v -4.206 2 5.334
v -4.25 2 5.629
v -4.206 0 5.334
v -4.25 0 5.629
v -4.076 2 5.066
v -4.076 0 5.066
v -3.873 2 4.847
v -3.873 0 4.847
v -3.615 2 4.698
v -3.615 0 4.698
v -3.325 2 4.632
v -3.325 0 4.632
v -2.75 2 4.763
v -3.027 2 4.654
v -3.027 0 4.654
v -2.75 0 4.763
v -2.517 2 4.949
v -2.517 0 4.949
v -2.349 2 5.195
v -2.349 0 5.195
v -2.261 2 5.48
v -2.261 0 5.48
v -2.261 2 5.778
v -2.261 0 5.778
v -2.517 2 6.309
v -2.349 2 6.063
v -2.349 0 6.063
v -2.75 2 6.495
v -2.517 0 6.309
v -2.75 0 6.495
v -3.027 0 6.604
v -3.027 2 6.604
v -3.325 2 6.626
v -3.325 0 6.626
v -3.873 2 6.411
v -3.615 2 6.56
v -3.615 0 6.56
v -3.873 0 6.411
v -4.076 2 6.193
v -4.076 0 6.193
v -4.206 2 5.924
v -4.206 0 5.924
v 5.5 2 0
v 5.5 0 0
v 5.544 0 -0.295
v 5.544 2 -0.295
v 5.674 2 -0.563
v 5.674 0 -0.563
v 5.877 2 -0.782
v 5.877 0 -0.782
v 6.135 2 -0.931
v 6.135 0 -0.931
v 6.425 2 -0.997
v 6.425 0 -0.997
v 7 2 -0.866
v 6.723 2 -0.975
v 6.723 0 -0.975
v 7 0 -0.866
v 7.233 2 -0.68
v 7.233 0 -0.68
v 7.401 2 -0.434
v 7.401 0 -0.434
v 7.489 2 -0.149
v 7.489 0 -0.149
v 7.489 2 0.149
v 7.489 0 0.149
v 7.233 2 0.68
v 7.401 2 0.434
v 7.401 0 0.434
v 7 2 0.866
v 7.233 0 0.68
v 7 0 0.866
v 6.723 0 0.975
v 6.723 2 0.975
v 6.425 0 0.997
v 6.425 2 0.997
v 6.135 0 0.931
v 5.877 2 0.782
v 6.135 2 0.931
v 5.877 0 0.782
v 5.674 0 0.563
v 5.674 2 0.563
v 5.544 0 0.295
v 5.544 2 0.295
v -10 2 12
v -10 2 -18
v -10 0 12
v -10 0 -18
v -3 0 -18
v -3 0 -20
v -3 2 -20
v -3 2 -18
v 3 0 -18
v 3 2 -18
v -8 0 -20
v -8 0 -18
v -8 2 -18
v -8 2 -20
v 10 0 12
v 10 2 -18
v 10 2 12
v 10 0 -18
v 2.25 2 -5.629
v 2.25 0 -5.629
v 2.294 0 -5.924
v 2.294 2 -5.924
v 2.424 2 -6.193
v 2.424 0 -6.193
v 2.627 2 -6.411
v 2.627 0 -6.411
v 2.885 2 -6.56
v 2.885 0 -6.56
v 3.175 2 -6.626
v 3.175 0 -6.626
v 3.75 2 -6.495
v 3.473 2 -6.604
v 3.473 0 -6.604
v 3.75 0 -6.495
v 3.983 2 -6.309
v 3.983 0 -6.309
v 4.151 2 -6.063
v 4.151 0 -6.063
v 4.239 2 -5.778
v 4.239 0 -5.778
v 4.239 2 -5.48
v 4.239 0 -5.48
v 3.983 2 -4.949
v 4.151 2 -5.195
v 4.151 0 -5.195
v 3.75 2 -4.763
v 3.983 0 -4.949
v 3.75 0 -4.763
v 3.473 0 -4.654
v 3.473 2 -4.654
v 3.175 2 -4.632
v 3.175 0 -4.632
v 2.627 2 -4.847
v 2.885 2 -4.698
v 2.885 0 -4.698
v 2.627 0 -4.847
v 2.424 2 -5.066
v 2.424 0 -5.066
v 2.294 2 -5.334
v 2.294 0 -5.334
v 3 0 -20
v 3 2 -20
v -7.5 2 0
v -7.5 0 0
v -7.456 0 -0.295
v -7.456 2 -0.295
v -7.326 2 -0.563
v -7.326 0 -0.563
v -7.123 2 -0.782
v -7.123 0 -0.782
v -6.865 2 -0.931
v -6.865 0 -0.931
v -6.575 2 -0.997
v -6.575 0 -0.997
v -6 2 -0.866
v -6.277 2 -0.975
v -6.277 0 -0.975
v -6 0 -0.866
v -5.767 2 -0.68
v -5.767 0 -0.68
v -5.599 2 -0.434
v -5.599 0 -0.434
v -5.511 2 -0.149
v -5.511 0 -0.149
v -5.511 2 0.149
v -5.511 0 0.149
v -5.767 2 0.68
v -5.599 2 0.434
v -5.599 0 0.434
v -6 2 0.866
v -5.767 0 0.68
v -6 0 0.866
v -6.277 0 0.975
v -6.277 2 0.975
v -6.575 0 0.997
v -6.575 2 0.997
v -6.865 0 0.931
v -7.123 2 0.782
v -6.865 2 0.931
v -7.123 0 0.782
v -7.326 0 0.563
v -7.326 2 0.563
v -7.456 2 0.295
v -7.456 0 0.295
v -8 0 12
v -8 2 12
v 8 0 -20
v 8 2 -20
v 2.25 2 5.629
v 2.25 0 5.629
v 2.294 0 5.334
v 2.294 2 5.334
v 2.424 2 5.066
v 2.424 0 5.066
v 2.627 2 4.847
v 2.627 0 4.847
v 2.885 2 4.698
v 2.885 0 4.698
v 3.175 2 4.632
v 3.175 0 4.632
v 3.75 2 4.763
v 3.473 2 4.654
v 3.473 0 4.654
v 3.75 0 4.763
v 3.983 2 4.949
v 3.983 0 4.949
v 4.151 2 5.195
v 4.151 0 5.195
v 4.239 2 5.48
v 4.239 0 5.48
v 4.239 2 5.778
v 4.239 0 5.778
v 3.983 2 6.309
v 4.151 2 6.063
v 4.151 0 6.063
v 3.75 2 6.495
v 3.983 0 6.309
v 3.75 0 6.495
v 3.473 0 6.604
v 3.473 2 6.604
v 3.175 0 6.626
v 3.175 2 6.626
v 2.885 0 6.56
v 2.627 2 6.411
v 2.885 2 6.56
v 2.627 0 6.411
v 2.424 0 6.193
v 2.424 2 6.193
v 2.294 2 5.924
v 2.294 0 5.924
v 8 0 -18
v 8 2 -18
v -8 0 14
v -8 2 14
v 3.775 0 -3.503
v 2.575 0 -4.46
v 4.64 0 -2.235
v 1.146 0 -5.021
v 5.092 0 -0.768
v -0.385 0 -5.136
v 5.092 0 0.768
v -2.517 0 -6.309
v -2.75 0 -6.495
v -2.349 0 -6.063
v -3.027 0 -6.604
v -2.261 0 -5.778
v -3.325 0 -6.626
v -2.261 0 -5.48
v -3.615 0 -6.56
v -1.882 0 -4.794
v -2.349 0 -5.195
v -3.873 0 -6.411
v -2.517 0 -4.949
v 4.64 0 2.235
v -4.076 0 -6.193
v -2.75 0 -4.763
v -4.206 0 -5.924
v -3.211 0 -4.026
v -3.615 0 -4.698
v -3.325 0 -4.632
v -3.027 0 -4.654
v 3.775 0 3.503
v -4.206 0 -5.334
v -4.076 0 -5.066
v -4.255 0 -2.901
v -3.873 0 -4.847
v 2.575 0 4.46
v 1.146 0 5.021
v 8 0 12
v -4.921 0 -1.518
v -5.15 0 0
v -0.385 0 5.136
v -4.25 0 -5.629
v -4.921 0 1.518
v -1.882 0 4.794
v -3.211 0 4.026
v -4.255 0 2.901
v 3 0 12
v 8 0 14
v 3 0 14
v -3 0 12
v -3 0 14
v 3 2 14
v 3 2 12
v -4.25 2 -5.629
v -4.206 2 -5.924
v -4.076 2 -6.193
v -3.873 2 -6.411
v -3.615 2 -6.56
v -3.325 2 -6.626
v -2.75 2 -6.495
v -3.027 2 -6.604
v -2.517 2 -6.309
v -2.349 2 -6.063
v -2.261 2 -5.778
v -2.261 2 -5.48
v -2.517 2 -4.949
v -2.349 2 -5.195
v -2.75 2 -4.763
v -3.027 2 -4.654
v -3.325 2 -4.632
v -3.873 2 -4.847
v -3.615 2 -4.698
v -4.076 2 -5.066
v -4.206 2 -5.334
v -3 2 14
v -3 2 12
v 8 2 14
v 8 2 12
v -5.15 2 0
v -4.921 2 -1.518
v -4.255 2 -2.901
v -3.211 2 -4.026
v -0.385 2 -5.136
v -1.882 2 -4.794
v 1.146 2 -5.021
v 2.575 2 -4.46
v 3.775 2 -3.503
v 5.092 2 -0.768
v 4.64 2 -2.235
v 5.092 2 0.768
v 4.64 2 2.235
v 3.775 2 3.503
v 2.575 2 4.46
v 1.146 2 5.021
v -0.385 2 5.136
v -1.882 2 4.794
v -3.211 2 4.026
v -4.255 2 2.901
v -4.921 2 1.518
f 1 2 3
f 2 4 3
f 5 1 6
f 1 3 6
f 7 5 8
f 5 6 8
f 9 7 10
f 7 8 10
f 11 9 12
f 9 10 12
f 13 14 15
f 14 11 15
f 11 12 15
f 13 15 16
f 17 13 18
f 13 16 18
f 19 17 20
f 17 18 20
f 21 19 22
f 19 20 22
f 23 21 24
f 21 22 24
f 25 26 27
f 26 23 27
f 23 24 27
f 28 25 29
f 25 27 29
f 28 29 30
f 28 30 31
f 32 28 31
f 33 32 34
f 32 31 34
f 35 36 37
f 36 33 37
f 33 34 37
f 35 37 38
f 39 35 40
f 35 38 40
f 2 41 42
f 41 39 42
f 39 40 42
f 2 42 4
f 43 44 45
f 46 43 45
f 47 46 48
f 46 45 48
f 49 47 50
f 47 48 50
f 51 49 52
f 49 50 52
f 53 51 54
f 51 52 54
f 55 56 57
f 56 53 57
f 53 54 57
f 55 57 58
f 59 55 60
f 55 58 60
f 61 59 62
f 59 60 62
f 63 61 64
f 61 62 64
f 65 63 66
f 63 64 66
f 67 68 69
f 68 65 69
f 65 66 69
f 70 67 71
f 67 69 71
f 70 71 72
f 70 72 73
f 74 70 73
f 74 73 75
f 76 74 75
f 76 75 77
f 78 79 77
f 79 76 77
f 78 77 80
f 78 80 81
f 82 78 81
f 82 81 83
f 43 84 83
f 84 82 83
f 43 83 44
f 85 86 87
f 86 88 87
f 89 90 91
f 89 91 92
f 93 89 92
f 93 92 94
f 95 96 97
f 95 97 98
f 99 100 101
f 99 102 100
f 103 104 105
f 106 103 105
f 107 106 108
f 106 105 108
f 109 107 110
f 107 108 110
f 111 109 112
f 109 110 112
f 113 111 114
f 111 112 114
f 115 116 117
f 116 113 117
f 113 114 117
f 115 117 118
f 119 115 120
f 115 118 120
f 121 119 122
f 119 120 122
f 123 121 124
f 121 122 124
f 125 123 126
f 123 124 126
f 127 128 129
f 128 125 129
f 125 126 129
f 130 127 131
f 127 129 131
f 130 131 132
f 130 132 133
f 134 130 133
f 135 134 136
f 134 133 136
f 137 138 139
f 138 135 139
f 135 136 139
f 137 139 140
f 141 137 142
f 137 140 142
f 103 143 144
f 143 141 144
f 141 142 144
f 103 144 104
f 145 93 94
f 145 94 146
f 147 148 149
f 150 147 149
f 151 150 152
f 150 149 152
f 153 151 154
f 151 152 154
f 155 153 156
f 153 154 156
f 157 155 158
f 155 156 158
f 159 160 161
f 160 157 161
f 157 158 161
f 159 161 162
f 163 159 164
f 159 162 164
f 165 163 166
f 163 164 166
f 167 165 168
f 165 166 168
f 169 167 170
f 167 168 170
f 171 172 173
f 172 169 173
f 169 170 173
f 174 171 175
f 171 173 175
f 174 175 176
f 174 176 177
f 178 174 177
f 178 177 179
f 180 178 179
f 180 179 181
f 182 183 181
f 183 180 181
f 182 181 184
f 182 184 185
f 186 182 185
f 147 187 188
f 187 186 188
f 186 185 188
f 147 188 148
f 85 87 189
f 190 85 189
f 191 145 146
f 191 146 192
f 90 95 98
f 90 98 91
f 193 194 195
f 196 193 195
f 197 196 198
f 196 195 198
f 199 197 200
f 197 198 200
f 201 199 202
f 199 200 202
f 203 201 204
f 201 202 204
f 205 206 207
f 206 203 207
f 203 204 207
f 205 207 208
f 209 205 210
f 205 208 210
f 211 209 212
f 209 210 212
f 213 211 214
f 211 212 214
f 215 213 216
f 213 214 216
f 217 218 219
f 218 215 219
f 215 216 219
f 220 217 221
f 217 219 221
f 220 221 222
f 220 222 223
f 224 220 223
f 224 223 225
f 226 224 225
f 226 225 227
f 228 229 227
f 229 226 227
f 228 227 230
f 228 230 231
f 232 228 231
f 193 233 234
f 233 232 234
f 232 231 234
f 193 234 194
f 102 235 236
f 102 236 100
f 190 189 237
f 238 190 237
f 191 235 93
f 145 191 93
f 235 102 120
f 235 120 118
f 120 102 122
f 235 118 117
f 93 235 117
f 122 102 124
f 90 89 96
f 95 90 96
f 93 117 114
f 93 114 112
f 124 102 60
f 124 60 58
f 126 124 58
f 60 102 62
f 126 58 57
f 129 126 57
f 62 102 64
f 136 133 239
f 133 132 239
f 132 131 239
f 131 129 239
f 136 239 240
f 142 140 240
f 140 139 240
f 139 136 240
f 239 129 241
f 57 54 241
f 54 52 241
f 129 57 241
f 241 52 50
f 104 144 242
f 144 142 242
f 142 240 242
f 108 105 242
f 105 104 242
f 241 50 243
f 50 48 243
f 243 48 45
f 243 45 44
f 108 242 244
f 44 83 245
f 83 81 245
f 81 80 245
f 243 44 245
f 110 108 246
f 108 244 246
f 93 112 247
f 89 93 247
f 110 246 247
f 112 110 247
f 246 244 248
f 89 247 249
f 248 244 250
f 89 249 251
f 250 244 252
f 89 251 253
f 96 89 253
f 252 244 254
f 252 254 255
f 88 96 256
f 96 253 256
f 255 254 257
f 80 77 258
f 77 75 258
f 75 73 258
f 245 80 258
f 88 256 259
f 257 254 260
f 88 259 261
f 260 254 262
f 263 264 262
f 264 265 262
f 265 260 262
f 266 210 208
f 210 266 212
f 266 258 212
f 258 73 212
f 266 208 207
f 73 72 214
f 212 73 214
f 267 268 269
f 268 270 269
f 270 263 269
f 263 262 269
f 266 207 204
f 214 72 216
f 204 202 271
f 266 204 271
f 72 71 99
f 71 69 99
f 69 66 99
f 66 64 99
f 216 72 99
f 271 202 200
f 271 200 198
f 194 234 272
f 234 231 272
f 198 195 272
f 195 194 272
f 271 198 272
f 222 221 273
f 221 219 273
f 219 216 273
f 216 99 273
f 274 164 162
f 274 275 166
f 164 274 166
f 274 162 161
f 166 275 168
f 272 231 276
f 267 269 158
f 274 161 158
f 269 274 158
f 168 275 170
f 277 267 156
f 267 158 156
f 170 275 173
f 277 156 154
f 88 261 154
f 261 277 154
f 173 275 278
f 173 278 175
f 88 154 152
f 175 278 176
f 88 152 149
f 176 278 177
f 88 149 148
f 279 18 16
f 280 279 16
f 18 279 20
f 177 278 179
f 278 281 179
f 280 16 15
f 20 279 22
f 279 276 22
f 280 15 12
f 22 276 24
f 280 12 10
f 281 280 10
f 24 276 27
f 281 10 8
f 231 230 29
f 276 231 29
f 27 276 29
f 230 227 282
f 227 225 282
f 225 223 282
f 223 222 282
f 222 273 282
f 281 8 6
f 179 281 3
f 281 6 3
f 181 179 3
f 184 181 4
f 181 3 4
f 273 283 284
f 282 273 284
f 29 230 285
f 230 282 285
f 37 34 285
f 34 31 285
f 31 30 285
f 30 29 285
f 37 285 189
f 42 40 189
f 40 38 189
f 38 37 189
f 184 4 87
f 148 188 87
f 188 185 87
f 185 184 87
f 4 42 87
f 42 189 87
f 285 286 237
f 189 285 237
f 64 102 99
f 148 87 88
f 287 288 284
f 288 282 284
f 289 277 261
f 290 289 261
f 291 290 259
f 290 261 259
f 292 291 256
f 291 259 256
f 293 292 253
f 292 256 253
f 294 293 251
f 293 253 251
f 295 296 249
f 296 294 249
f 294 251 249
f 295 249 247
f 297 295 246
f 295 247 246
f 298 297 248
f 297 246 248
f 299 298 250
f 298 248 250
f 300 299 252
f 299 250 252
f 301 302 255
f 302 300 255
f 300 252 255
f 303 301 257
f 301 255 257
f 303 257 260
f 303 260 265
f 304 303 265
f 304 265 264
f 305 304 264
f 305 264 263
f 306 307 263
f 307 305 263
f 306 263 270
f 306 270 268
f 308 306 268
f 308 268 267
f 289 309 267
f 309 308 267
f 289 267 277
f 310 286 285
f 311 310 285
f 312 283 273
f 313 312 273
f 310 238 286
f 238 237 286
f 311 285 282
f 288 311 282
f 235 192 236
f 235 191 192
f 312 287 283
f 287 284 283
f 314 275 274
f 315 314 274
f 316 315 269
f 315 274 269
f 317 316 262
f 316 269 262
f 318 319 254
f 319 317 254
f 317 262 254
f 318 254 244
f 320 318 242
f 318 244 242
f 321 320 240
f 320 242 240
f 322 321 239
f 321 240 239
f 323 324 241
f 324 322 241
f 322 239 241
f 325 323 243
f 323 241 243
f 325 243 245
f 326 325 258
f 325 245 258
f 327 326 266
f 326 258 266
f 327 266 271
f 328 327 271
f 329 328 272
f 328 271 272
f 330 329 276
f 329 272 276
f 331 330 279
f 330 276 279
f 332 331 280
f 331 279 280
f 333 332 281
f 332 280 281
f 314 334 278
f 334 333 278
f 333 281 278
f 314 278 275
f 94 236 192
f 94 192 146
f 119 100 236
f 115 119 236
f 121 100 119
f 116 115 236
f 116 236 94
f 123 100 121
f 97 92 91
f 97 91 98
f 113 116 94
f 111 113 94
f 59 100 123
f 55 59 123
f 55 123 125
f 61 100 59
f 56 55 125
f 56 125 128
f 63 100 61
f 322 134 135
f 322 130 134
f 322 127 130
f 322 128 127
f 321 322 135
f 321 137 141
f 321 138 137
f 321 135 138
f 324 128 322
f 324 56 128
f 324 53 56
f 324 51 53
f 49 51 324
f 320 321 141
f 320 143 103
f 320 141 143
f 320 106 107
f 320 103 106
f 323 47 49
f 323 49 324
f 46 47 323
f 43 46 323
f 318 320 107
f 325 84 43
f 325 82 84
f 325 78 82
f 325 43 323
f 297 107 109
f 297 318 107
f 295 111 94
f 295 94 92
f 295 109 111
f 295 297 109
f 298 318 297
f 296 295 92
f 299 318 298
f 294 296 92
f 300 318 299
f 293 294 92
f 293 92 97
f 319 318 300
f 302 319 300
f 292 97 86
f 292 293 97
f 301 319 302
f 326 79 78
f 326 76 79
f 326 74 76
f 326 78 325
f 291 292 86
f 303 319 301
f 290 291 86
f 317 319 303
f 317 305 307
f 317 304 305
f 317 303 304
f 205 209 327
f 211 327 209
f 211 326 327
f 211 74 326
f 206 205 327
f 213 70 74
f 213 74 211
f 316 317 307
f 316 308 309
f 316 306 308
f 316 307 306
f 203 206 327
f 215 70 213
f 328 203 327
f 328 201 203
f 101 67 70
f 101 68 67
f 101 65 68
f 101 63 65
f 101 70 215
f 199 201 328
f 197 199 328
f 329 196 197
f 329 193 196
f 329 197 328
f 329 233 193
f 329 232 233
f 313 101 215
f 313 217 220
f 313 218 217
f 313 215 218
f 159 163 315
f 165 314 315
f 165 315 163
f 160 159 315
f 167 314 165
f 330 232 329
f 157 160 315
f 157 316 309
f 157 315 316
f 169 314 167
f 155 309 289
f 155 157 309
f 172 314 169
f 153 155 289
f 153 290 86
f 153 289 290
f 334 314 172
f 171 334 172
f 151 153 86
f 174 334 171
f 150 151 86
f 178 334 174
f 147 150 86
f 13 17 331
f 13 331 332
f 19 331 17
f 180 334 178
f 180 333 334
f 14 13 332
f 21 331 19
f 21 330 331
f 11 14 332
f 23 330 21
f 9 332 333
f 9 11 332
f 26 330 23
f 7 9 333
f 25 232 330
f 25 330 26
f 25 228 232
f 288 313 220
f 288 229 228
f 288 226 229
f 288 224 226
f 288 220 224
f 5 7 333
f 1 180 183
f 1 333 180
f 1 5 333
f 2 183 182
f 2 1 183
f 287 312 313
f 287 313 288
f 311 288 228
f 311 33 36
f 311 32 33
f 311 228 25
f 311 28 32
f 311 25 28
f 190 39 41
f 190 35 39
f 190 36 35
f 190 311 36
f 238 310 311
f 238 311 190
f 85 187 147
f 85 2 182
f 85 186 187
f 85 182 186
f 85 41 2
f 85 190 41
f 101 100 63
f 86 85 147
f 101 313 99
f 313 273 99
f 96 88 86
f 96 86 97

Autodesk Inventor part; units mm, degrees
ref_plane "YZ Plane" through (0, 0, 0) normal (1, 0, 0) x (0, 1, 0)
ref_plane "XZ Plane" through (0, 0, 0) normal (0, 1, 0) x (-1, 0, 0)
ref_plane "XY Plane" through (0, 0, 0) normal (0, 0, 1) x (1, 0, 0)
sketch "Sketch1" plane through (0, 0, 0) normal (0, 1, 0) x (-1, 0, 0)
  circle A0 centre (0, 0) radius 5.15
  circle A1 centre (6.5, 0) radius 1
  circle A2 centre (3.25, 5.6292) radius 1
  circle A3 centre (-3.25, 5.6292) radius 1
  circle A4 centre (-6.5, 0) radius 1
  circle A5 centre (-3.25, -5.6292) radius 1
  circle A6 centre (3.25, -5.6292) radius 1
  line L0 (10, -18) -> (8, -18)
  line L1 (8, -18) -> (8, -20)
  line L2 (8, -20) -> (3, -20)
  line L3 (3, -20) -> (3, -18)
  line L4 (3, -18) -> (-3, -18)
  line L5 (-3, -18) -> (-3, -20)
  line L6 (-3, -20) -> (-8, -20)
  line L7 (-8, -20) -> (-8, -18)
  line L8 (-8, -18) -> (-10, -18)
  line L9 (10, -18) -> (10, 12)
  line L10 (-10, -18) -> (-10, 12)
  line L11 (10, 12) -> (8, 12)
  line L12 (8, 12) -> (8, 14)
  line L13 (8, 14) -> (3, 14)
  line L14 (3, 14) -> (3, 12)
  line L15 (3, 12) -> (-3, 12)
  line L16 (-3, 12) -> (-3, 14)
  line L17 (-3, 14) -> (-8, 14)
  line L18 (-8, 14) -> (-8, 12)
  line L19 (-8, 12) -> (-10, 12)
  dimension "d7" = 360
  dimension "d4" = 2
  dimension "d33" = 2
  dimension "d34" = 2
  dimension "d35" = 5
  dimension "d36" = 6
  dimension "d37" = 5
  dimension "d42" = 30
  dimension "d43" = 2
  dimension "d44" = 2
  dimension "d45" = 5
  dimension "d46" = 6
  dimension "d47" = 5
extrude "Extrusion1" add sketch "Sketch1" along normal blind 2
properties part number "Motor Mount"
